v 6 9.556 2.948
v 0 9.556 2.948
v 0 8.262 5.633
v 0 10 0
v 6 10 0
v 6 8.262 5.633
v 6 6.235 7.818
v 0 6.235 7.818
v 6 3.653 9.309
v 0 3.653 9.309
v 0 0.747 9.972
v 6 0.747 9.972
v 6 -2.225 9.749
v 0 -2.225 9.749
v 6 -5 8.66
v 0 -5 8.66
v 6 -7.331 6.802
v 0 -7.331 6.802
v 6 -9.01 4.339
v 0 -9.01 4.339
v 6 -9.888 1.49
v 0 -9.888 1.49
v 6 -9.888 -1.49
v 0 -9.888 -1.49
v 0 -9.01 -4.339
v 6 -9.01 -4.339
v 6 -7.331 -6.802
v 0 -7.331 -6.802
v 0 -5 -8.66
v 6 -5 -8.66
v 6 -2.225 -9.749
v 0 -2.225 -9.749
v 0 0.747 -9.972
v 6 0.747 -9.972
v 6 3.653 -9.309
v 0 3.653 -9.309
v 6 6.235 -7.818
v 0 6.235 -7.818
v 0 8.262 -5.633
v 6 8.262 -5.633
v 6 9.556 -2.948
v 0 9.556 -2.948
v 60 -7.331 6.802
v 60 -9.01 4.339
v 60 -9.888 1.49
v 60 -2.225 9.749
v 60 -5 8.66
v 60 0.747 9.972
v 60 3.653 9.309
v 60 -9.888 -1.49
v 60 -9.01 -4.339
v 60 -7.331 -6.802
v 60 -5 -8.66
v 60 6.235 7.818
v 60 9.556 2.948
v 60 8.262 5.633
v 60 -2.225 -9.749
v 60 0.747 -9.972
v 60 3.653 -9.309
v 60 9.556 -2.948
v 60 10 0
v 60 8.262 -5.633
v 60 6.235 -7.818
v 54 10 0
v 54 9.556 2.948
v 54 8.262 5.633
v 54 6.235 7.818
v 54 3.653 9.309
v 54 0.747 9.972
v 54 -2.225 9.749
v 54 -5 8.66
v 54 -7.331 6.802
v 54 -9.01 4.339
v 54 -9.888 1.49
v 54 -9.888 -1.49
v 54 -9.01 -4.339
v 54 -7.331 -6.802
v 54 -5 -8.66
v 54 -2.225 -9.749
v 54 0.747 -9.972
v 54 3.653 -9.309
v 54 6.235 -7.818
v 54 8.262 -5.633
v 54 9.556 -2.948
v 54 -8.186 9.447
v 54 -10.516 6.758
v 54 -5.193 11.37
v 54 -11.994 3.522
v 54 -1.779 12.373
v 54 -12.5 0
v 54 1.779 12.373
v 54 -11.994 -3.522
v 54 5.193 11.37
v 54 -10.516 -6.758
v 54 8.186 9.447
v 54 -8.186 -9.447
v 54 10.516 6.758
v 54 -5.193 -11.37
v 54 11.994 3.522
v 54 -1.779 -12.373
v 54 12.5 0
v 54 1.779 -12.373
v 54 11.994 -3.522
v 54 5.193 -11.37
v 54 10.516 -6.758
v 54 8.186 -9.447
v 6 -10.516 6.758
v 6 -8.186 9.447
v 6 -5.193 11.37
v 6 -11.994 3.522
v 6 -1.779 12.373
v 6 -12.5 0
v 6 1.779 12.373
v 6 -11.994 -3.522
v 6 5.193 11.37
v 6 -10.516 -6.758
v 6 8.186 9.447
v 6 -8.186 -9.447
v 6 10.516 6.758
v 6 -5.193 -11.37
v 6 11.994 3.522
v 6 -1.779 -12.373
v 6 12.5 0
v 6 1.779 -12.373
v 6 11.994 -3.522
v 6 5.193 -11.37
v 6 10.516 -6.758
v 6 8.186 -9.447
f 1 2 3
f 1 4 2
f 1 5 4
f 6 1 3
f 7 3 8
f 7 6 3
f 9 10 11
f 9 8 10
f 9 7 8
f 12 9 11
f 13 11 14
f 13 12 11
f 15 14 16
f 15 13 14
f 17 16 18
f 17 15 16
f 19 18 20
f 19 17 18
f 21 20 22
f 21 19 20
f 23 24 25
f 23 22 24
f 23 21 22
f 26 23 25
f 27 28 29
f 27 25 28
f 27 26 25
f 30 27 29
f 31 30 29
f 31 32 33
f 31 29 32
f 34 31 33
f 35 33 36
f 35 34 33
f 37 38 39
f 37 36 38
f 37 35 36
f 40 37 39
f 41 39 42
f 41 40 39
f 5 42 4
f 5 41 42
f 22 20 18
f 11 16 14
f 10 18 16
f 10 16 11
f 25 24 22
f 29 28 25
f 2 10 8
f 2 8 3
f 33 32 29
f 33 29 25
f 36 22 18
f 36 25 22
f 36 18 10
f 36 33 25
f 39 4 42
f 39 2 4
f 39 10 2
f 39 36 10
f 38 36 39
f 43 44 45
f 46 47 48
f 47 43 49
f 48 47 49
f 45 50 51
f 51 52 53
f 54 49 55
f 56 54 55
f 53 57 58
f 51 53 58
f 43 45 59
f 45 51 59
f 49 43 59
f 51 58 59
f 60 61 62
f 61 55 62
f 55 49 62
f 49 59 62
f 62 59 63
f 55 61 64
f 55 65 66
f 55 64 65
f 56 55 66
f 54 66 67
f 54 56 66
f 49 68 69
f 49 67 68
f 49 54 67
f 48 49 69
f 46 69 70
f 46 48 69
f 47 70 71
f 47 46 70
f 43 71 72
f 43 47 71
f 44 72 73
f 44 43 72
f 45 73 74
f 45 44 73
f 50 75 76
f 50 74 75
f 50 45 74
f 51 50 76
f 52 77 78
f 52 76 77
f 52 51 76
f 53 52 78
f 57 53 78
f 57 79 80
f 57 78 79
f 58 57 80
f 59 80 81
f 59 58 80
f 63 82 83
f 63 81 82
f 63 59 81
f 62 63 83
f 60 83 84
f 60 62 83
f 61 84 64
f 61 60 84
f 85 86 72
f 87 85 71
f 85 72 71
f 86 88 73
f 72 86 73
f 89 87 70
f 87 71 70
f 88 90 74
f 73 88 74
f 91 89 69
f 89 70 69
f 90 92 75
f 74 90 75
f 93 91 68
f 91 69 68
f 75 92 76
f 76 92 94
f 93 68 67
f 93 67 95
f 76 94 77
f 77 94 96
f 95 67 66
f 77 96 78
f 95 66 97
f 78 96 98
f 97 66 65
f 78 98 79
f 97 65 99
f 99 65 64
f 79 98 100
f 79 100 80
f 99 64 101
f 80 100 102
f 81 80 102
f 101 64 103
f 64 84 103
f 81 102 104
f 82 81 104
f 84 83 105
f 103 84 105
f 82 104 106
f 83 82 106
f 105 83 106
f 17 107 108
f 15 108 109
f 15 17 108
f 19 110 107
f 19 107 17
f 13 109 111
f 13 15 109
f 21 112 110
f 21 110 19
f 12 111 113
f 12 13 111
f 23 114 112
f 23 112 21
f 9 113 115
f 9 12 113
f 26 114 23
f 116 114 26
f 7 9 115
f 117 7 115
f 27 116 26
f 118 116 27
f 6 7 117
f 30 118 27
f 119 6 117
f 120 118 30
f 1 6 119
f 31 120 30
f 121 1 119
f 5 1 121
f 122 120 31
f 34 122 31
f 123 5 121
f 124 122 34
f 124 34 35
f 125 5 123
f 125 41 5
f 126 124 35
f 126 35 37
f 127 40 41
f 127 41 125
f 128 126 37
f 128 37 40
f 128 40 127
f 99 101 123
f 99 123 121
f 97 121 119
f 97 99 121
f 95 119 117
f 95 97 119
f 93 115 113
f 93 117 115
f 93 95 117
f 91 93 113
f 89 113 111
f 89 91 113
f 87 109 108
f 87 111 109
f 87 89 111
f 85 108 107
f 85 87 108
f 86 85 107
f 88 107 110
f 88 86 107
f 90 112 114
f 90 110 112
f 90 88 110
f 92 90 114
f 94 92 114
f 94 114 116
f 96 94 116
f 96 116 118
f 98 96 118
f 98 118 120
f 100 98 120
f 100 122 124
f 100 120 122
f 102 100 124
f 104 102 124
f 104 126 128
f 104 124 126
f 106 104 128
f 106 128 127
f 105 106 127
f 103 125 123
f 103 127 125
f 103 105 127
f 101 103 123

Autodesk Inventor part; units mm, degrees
ref_plane "YZ Plane" through (0, 0, 0) normal (1, 0, 0) x (0, 1, 0)
ref_plane "XZ Plane" through (0, 0, 0) normal (0, 1, 0) x (-1, 0, 0)
ref_plane "XY Plane" through (0, 0, 0) normal (0, 0, 1) x (1, 0, 0)
sketch "Sketch1" plane through (0, 0, 0) normal (0, 0, 1) x (1, 0, 0)
  line L0 (0, 0) -> (0, 10)
  line L1 (0, 10) -> (6, 10)
  line L2 (6, 10) -> (6, 12.5)
  line L3 (6, 12.5) -> (54, 12.5)
  line L4 (54, 12.5) -> (54, 10)
  line L5 (54, 10) -> (60, 10)
  line L6 (60, 10) -> (60, 0)
  line L7 (60, 0) -> (0, 0)
  dimension "d0" = 10
  dimension "d1" = 6
  dimension "d2" = 2.5
  dimension "d3" = 48
  dimension "d4" = 2.5
  dimension "d5" = 6
  dimension "d6" = 10
revolve "Revolution1" add sketch "Sketch1" angle 360 about axis through (60, 0, 0) along (-1, 0, 0)
sketch "Sketch2" plane through (60, 0, 0) normal (1, 0, 0) x (0, 0, -1)
  point P0 (0, 0)
  point P1 (-32.9803, -18.1231)
properties part number "roller pin"
